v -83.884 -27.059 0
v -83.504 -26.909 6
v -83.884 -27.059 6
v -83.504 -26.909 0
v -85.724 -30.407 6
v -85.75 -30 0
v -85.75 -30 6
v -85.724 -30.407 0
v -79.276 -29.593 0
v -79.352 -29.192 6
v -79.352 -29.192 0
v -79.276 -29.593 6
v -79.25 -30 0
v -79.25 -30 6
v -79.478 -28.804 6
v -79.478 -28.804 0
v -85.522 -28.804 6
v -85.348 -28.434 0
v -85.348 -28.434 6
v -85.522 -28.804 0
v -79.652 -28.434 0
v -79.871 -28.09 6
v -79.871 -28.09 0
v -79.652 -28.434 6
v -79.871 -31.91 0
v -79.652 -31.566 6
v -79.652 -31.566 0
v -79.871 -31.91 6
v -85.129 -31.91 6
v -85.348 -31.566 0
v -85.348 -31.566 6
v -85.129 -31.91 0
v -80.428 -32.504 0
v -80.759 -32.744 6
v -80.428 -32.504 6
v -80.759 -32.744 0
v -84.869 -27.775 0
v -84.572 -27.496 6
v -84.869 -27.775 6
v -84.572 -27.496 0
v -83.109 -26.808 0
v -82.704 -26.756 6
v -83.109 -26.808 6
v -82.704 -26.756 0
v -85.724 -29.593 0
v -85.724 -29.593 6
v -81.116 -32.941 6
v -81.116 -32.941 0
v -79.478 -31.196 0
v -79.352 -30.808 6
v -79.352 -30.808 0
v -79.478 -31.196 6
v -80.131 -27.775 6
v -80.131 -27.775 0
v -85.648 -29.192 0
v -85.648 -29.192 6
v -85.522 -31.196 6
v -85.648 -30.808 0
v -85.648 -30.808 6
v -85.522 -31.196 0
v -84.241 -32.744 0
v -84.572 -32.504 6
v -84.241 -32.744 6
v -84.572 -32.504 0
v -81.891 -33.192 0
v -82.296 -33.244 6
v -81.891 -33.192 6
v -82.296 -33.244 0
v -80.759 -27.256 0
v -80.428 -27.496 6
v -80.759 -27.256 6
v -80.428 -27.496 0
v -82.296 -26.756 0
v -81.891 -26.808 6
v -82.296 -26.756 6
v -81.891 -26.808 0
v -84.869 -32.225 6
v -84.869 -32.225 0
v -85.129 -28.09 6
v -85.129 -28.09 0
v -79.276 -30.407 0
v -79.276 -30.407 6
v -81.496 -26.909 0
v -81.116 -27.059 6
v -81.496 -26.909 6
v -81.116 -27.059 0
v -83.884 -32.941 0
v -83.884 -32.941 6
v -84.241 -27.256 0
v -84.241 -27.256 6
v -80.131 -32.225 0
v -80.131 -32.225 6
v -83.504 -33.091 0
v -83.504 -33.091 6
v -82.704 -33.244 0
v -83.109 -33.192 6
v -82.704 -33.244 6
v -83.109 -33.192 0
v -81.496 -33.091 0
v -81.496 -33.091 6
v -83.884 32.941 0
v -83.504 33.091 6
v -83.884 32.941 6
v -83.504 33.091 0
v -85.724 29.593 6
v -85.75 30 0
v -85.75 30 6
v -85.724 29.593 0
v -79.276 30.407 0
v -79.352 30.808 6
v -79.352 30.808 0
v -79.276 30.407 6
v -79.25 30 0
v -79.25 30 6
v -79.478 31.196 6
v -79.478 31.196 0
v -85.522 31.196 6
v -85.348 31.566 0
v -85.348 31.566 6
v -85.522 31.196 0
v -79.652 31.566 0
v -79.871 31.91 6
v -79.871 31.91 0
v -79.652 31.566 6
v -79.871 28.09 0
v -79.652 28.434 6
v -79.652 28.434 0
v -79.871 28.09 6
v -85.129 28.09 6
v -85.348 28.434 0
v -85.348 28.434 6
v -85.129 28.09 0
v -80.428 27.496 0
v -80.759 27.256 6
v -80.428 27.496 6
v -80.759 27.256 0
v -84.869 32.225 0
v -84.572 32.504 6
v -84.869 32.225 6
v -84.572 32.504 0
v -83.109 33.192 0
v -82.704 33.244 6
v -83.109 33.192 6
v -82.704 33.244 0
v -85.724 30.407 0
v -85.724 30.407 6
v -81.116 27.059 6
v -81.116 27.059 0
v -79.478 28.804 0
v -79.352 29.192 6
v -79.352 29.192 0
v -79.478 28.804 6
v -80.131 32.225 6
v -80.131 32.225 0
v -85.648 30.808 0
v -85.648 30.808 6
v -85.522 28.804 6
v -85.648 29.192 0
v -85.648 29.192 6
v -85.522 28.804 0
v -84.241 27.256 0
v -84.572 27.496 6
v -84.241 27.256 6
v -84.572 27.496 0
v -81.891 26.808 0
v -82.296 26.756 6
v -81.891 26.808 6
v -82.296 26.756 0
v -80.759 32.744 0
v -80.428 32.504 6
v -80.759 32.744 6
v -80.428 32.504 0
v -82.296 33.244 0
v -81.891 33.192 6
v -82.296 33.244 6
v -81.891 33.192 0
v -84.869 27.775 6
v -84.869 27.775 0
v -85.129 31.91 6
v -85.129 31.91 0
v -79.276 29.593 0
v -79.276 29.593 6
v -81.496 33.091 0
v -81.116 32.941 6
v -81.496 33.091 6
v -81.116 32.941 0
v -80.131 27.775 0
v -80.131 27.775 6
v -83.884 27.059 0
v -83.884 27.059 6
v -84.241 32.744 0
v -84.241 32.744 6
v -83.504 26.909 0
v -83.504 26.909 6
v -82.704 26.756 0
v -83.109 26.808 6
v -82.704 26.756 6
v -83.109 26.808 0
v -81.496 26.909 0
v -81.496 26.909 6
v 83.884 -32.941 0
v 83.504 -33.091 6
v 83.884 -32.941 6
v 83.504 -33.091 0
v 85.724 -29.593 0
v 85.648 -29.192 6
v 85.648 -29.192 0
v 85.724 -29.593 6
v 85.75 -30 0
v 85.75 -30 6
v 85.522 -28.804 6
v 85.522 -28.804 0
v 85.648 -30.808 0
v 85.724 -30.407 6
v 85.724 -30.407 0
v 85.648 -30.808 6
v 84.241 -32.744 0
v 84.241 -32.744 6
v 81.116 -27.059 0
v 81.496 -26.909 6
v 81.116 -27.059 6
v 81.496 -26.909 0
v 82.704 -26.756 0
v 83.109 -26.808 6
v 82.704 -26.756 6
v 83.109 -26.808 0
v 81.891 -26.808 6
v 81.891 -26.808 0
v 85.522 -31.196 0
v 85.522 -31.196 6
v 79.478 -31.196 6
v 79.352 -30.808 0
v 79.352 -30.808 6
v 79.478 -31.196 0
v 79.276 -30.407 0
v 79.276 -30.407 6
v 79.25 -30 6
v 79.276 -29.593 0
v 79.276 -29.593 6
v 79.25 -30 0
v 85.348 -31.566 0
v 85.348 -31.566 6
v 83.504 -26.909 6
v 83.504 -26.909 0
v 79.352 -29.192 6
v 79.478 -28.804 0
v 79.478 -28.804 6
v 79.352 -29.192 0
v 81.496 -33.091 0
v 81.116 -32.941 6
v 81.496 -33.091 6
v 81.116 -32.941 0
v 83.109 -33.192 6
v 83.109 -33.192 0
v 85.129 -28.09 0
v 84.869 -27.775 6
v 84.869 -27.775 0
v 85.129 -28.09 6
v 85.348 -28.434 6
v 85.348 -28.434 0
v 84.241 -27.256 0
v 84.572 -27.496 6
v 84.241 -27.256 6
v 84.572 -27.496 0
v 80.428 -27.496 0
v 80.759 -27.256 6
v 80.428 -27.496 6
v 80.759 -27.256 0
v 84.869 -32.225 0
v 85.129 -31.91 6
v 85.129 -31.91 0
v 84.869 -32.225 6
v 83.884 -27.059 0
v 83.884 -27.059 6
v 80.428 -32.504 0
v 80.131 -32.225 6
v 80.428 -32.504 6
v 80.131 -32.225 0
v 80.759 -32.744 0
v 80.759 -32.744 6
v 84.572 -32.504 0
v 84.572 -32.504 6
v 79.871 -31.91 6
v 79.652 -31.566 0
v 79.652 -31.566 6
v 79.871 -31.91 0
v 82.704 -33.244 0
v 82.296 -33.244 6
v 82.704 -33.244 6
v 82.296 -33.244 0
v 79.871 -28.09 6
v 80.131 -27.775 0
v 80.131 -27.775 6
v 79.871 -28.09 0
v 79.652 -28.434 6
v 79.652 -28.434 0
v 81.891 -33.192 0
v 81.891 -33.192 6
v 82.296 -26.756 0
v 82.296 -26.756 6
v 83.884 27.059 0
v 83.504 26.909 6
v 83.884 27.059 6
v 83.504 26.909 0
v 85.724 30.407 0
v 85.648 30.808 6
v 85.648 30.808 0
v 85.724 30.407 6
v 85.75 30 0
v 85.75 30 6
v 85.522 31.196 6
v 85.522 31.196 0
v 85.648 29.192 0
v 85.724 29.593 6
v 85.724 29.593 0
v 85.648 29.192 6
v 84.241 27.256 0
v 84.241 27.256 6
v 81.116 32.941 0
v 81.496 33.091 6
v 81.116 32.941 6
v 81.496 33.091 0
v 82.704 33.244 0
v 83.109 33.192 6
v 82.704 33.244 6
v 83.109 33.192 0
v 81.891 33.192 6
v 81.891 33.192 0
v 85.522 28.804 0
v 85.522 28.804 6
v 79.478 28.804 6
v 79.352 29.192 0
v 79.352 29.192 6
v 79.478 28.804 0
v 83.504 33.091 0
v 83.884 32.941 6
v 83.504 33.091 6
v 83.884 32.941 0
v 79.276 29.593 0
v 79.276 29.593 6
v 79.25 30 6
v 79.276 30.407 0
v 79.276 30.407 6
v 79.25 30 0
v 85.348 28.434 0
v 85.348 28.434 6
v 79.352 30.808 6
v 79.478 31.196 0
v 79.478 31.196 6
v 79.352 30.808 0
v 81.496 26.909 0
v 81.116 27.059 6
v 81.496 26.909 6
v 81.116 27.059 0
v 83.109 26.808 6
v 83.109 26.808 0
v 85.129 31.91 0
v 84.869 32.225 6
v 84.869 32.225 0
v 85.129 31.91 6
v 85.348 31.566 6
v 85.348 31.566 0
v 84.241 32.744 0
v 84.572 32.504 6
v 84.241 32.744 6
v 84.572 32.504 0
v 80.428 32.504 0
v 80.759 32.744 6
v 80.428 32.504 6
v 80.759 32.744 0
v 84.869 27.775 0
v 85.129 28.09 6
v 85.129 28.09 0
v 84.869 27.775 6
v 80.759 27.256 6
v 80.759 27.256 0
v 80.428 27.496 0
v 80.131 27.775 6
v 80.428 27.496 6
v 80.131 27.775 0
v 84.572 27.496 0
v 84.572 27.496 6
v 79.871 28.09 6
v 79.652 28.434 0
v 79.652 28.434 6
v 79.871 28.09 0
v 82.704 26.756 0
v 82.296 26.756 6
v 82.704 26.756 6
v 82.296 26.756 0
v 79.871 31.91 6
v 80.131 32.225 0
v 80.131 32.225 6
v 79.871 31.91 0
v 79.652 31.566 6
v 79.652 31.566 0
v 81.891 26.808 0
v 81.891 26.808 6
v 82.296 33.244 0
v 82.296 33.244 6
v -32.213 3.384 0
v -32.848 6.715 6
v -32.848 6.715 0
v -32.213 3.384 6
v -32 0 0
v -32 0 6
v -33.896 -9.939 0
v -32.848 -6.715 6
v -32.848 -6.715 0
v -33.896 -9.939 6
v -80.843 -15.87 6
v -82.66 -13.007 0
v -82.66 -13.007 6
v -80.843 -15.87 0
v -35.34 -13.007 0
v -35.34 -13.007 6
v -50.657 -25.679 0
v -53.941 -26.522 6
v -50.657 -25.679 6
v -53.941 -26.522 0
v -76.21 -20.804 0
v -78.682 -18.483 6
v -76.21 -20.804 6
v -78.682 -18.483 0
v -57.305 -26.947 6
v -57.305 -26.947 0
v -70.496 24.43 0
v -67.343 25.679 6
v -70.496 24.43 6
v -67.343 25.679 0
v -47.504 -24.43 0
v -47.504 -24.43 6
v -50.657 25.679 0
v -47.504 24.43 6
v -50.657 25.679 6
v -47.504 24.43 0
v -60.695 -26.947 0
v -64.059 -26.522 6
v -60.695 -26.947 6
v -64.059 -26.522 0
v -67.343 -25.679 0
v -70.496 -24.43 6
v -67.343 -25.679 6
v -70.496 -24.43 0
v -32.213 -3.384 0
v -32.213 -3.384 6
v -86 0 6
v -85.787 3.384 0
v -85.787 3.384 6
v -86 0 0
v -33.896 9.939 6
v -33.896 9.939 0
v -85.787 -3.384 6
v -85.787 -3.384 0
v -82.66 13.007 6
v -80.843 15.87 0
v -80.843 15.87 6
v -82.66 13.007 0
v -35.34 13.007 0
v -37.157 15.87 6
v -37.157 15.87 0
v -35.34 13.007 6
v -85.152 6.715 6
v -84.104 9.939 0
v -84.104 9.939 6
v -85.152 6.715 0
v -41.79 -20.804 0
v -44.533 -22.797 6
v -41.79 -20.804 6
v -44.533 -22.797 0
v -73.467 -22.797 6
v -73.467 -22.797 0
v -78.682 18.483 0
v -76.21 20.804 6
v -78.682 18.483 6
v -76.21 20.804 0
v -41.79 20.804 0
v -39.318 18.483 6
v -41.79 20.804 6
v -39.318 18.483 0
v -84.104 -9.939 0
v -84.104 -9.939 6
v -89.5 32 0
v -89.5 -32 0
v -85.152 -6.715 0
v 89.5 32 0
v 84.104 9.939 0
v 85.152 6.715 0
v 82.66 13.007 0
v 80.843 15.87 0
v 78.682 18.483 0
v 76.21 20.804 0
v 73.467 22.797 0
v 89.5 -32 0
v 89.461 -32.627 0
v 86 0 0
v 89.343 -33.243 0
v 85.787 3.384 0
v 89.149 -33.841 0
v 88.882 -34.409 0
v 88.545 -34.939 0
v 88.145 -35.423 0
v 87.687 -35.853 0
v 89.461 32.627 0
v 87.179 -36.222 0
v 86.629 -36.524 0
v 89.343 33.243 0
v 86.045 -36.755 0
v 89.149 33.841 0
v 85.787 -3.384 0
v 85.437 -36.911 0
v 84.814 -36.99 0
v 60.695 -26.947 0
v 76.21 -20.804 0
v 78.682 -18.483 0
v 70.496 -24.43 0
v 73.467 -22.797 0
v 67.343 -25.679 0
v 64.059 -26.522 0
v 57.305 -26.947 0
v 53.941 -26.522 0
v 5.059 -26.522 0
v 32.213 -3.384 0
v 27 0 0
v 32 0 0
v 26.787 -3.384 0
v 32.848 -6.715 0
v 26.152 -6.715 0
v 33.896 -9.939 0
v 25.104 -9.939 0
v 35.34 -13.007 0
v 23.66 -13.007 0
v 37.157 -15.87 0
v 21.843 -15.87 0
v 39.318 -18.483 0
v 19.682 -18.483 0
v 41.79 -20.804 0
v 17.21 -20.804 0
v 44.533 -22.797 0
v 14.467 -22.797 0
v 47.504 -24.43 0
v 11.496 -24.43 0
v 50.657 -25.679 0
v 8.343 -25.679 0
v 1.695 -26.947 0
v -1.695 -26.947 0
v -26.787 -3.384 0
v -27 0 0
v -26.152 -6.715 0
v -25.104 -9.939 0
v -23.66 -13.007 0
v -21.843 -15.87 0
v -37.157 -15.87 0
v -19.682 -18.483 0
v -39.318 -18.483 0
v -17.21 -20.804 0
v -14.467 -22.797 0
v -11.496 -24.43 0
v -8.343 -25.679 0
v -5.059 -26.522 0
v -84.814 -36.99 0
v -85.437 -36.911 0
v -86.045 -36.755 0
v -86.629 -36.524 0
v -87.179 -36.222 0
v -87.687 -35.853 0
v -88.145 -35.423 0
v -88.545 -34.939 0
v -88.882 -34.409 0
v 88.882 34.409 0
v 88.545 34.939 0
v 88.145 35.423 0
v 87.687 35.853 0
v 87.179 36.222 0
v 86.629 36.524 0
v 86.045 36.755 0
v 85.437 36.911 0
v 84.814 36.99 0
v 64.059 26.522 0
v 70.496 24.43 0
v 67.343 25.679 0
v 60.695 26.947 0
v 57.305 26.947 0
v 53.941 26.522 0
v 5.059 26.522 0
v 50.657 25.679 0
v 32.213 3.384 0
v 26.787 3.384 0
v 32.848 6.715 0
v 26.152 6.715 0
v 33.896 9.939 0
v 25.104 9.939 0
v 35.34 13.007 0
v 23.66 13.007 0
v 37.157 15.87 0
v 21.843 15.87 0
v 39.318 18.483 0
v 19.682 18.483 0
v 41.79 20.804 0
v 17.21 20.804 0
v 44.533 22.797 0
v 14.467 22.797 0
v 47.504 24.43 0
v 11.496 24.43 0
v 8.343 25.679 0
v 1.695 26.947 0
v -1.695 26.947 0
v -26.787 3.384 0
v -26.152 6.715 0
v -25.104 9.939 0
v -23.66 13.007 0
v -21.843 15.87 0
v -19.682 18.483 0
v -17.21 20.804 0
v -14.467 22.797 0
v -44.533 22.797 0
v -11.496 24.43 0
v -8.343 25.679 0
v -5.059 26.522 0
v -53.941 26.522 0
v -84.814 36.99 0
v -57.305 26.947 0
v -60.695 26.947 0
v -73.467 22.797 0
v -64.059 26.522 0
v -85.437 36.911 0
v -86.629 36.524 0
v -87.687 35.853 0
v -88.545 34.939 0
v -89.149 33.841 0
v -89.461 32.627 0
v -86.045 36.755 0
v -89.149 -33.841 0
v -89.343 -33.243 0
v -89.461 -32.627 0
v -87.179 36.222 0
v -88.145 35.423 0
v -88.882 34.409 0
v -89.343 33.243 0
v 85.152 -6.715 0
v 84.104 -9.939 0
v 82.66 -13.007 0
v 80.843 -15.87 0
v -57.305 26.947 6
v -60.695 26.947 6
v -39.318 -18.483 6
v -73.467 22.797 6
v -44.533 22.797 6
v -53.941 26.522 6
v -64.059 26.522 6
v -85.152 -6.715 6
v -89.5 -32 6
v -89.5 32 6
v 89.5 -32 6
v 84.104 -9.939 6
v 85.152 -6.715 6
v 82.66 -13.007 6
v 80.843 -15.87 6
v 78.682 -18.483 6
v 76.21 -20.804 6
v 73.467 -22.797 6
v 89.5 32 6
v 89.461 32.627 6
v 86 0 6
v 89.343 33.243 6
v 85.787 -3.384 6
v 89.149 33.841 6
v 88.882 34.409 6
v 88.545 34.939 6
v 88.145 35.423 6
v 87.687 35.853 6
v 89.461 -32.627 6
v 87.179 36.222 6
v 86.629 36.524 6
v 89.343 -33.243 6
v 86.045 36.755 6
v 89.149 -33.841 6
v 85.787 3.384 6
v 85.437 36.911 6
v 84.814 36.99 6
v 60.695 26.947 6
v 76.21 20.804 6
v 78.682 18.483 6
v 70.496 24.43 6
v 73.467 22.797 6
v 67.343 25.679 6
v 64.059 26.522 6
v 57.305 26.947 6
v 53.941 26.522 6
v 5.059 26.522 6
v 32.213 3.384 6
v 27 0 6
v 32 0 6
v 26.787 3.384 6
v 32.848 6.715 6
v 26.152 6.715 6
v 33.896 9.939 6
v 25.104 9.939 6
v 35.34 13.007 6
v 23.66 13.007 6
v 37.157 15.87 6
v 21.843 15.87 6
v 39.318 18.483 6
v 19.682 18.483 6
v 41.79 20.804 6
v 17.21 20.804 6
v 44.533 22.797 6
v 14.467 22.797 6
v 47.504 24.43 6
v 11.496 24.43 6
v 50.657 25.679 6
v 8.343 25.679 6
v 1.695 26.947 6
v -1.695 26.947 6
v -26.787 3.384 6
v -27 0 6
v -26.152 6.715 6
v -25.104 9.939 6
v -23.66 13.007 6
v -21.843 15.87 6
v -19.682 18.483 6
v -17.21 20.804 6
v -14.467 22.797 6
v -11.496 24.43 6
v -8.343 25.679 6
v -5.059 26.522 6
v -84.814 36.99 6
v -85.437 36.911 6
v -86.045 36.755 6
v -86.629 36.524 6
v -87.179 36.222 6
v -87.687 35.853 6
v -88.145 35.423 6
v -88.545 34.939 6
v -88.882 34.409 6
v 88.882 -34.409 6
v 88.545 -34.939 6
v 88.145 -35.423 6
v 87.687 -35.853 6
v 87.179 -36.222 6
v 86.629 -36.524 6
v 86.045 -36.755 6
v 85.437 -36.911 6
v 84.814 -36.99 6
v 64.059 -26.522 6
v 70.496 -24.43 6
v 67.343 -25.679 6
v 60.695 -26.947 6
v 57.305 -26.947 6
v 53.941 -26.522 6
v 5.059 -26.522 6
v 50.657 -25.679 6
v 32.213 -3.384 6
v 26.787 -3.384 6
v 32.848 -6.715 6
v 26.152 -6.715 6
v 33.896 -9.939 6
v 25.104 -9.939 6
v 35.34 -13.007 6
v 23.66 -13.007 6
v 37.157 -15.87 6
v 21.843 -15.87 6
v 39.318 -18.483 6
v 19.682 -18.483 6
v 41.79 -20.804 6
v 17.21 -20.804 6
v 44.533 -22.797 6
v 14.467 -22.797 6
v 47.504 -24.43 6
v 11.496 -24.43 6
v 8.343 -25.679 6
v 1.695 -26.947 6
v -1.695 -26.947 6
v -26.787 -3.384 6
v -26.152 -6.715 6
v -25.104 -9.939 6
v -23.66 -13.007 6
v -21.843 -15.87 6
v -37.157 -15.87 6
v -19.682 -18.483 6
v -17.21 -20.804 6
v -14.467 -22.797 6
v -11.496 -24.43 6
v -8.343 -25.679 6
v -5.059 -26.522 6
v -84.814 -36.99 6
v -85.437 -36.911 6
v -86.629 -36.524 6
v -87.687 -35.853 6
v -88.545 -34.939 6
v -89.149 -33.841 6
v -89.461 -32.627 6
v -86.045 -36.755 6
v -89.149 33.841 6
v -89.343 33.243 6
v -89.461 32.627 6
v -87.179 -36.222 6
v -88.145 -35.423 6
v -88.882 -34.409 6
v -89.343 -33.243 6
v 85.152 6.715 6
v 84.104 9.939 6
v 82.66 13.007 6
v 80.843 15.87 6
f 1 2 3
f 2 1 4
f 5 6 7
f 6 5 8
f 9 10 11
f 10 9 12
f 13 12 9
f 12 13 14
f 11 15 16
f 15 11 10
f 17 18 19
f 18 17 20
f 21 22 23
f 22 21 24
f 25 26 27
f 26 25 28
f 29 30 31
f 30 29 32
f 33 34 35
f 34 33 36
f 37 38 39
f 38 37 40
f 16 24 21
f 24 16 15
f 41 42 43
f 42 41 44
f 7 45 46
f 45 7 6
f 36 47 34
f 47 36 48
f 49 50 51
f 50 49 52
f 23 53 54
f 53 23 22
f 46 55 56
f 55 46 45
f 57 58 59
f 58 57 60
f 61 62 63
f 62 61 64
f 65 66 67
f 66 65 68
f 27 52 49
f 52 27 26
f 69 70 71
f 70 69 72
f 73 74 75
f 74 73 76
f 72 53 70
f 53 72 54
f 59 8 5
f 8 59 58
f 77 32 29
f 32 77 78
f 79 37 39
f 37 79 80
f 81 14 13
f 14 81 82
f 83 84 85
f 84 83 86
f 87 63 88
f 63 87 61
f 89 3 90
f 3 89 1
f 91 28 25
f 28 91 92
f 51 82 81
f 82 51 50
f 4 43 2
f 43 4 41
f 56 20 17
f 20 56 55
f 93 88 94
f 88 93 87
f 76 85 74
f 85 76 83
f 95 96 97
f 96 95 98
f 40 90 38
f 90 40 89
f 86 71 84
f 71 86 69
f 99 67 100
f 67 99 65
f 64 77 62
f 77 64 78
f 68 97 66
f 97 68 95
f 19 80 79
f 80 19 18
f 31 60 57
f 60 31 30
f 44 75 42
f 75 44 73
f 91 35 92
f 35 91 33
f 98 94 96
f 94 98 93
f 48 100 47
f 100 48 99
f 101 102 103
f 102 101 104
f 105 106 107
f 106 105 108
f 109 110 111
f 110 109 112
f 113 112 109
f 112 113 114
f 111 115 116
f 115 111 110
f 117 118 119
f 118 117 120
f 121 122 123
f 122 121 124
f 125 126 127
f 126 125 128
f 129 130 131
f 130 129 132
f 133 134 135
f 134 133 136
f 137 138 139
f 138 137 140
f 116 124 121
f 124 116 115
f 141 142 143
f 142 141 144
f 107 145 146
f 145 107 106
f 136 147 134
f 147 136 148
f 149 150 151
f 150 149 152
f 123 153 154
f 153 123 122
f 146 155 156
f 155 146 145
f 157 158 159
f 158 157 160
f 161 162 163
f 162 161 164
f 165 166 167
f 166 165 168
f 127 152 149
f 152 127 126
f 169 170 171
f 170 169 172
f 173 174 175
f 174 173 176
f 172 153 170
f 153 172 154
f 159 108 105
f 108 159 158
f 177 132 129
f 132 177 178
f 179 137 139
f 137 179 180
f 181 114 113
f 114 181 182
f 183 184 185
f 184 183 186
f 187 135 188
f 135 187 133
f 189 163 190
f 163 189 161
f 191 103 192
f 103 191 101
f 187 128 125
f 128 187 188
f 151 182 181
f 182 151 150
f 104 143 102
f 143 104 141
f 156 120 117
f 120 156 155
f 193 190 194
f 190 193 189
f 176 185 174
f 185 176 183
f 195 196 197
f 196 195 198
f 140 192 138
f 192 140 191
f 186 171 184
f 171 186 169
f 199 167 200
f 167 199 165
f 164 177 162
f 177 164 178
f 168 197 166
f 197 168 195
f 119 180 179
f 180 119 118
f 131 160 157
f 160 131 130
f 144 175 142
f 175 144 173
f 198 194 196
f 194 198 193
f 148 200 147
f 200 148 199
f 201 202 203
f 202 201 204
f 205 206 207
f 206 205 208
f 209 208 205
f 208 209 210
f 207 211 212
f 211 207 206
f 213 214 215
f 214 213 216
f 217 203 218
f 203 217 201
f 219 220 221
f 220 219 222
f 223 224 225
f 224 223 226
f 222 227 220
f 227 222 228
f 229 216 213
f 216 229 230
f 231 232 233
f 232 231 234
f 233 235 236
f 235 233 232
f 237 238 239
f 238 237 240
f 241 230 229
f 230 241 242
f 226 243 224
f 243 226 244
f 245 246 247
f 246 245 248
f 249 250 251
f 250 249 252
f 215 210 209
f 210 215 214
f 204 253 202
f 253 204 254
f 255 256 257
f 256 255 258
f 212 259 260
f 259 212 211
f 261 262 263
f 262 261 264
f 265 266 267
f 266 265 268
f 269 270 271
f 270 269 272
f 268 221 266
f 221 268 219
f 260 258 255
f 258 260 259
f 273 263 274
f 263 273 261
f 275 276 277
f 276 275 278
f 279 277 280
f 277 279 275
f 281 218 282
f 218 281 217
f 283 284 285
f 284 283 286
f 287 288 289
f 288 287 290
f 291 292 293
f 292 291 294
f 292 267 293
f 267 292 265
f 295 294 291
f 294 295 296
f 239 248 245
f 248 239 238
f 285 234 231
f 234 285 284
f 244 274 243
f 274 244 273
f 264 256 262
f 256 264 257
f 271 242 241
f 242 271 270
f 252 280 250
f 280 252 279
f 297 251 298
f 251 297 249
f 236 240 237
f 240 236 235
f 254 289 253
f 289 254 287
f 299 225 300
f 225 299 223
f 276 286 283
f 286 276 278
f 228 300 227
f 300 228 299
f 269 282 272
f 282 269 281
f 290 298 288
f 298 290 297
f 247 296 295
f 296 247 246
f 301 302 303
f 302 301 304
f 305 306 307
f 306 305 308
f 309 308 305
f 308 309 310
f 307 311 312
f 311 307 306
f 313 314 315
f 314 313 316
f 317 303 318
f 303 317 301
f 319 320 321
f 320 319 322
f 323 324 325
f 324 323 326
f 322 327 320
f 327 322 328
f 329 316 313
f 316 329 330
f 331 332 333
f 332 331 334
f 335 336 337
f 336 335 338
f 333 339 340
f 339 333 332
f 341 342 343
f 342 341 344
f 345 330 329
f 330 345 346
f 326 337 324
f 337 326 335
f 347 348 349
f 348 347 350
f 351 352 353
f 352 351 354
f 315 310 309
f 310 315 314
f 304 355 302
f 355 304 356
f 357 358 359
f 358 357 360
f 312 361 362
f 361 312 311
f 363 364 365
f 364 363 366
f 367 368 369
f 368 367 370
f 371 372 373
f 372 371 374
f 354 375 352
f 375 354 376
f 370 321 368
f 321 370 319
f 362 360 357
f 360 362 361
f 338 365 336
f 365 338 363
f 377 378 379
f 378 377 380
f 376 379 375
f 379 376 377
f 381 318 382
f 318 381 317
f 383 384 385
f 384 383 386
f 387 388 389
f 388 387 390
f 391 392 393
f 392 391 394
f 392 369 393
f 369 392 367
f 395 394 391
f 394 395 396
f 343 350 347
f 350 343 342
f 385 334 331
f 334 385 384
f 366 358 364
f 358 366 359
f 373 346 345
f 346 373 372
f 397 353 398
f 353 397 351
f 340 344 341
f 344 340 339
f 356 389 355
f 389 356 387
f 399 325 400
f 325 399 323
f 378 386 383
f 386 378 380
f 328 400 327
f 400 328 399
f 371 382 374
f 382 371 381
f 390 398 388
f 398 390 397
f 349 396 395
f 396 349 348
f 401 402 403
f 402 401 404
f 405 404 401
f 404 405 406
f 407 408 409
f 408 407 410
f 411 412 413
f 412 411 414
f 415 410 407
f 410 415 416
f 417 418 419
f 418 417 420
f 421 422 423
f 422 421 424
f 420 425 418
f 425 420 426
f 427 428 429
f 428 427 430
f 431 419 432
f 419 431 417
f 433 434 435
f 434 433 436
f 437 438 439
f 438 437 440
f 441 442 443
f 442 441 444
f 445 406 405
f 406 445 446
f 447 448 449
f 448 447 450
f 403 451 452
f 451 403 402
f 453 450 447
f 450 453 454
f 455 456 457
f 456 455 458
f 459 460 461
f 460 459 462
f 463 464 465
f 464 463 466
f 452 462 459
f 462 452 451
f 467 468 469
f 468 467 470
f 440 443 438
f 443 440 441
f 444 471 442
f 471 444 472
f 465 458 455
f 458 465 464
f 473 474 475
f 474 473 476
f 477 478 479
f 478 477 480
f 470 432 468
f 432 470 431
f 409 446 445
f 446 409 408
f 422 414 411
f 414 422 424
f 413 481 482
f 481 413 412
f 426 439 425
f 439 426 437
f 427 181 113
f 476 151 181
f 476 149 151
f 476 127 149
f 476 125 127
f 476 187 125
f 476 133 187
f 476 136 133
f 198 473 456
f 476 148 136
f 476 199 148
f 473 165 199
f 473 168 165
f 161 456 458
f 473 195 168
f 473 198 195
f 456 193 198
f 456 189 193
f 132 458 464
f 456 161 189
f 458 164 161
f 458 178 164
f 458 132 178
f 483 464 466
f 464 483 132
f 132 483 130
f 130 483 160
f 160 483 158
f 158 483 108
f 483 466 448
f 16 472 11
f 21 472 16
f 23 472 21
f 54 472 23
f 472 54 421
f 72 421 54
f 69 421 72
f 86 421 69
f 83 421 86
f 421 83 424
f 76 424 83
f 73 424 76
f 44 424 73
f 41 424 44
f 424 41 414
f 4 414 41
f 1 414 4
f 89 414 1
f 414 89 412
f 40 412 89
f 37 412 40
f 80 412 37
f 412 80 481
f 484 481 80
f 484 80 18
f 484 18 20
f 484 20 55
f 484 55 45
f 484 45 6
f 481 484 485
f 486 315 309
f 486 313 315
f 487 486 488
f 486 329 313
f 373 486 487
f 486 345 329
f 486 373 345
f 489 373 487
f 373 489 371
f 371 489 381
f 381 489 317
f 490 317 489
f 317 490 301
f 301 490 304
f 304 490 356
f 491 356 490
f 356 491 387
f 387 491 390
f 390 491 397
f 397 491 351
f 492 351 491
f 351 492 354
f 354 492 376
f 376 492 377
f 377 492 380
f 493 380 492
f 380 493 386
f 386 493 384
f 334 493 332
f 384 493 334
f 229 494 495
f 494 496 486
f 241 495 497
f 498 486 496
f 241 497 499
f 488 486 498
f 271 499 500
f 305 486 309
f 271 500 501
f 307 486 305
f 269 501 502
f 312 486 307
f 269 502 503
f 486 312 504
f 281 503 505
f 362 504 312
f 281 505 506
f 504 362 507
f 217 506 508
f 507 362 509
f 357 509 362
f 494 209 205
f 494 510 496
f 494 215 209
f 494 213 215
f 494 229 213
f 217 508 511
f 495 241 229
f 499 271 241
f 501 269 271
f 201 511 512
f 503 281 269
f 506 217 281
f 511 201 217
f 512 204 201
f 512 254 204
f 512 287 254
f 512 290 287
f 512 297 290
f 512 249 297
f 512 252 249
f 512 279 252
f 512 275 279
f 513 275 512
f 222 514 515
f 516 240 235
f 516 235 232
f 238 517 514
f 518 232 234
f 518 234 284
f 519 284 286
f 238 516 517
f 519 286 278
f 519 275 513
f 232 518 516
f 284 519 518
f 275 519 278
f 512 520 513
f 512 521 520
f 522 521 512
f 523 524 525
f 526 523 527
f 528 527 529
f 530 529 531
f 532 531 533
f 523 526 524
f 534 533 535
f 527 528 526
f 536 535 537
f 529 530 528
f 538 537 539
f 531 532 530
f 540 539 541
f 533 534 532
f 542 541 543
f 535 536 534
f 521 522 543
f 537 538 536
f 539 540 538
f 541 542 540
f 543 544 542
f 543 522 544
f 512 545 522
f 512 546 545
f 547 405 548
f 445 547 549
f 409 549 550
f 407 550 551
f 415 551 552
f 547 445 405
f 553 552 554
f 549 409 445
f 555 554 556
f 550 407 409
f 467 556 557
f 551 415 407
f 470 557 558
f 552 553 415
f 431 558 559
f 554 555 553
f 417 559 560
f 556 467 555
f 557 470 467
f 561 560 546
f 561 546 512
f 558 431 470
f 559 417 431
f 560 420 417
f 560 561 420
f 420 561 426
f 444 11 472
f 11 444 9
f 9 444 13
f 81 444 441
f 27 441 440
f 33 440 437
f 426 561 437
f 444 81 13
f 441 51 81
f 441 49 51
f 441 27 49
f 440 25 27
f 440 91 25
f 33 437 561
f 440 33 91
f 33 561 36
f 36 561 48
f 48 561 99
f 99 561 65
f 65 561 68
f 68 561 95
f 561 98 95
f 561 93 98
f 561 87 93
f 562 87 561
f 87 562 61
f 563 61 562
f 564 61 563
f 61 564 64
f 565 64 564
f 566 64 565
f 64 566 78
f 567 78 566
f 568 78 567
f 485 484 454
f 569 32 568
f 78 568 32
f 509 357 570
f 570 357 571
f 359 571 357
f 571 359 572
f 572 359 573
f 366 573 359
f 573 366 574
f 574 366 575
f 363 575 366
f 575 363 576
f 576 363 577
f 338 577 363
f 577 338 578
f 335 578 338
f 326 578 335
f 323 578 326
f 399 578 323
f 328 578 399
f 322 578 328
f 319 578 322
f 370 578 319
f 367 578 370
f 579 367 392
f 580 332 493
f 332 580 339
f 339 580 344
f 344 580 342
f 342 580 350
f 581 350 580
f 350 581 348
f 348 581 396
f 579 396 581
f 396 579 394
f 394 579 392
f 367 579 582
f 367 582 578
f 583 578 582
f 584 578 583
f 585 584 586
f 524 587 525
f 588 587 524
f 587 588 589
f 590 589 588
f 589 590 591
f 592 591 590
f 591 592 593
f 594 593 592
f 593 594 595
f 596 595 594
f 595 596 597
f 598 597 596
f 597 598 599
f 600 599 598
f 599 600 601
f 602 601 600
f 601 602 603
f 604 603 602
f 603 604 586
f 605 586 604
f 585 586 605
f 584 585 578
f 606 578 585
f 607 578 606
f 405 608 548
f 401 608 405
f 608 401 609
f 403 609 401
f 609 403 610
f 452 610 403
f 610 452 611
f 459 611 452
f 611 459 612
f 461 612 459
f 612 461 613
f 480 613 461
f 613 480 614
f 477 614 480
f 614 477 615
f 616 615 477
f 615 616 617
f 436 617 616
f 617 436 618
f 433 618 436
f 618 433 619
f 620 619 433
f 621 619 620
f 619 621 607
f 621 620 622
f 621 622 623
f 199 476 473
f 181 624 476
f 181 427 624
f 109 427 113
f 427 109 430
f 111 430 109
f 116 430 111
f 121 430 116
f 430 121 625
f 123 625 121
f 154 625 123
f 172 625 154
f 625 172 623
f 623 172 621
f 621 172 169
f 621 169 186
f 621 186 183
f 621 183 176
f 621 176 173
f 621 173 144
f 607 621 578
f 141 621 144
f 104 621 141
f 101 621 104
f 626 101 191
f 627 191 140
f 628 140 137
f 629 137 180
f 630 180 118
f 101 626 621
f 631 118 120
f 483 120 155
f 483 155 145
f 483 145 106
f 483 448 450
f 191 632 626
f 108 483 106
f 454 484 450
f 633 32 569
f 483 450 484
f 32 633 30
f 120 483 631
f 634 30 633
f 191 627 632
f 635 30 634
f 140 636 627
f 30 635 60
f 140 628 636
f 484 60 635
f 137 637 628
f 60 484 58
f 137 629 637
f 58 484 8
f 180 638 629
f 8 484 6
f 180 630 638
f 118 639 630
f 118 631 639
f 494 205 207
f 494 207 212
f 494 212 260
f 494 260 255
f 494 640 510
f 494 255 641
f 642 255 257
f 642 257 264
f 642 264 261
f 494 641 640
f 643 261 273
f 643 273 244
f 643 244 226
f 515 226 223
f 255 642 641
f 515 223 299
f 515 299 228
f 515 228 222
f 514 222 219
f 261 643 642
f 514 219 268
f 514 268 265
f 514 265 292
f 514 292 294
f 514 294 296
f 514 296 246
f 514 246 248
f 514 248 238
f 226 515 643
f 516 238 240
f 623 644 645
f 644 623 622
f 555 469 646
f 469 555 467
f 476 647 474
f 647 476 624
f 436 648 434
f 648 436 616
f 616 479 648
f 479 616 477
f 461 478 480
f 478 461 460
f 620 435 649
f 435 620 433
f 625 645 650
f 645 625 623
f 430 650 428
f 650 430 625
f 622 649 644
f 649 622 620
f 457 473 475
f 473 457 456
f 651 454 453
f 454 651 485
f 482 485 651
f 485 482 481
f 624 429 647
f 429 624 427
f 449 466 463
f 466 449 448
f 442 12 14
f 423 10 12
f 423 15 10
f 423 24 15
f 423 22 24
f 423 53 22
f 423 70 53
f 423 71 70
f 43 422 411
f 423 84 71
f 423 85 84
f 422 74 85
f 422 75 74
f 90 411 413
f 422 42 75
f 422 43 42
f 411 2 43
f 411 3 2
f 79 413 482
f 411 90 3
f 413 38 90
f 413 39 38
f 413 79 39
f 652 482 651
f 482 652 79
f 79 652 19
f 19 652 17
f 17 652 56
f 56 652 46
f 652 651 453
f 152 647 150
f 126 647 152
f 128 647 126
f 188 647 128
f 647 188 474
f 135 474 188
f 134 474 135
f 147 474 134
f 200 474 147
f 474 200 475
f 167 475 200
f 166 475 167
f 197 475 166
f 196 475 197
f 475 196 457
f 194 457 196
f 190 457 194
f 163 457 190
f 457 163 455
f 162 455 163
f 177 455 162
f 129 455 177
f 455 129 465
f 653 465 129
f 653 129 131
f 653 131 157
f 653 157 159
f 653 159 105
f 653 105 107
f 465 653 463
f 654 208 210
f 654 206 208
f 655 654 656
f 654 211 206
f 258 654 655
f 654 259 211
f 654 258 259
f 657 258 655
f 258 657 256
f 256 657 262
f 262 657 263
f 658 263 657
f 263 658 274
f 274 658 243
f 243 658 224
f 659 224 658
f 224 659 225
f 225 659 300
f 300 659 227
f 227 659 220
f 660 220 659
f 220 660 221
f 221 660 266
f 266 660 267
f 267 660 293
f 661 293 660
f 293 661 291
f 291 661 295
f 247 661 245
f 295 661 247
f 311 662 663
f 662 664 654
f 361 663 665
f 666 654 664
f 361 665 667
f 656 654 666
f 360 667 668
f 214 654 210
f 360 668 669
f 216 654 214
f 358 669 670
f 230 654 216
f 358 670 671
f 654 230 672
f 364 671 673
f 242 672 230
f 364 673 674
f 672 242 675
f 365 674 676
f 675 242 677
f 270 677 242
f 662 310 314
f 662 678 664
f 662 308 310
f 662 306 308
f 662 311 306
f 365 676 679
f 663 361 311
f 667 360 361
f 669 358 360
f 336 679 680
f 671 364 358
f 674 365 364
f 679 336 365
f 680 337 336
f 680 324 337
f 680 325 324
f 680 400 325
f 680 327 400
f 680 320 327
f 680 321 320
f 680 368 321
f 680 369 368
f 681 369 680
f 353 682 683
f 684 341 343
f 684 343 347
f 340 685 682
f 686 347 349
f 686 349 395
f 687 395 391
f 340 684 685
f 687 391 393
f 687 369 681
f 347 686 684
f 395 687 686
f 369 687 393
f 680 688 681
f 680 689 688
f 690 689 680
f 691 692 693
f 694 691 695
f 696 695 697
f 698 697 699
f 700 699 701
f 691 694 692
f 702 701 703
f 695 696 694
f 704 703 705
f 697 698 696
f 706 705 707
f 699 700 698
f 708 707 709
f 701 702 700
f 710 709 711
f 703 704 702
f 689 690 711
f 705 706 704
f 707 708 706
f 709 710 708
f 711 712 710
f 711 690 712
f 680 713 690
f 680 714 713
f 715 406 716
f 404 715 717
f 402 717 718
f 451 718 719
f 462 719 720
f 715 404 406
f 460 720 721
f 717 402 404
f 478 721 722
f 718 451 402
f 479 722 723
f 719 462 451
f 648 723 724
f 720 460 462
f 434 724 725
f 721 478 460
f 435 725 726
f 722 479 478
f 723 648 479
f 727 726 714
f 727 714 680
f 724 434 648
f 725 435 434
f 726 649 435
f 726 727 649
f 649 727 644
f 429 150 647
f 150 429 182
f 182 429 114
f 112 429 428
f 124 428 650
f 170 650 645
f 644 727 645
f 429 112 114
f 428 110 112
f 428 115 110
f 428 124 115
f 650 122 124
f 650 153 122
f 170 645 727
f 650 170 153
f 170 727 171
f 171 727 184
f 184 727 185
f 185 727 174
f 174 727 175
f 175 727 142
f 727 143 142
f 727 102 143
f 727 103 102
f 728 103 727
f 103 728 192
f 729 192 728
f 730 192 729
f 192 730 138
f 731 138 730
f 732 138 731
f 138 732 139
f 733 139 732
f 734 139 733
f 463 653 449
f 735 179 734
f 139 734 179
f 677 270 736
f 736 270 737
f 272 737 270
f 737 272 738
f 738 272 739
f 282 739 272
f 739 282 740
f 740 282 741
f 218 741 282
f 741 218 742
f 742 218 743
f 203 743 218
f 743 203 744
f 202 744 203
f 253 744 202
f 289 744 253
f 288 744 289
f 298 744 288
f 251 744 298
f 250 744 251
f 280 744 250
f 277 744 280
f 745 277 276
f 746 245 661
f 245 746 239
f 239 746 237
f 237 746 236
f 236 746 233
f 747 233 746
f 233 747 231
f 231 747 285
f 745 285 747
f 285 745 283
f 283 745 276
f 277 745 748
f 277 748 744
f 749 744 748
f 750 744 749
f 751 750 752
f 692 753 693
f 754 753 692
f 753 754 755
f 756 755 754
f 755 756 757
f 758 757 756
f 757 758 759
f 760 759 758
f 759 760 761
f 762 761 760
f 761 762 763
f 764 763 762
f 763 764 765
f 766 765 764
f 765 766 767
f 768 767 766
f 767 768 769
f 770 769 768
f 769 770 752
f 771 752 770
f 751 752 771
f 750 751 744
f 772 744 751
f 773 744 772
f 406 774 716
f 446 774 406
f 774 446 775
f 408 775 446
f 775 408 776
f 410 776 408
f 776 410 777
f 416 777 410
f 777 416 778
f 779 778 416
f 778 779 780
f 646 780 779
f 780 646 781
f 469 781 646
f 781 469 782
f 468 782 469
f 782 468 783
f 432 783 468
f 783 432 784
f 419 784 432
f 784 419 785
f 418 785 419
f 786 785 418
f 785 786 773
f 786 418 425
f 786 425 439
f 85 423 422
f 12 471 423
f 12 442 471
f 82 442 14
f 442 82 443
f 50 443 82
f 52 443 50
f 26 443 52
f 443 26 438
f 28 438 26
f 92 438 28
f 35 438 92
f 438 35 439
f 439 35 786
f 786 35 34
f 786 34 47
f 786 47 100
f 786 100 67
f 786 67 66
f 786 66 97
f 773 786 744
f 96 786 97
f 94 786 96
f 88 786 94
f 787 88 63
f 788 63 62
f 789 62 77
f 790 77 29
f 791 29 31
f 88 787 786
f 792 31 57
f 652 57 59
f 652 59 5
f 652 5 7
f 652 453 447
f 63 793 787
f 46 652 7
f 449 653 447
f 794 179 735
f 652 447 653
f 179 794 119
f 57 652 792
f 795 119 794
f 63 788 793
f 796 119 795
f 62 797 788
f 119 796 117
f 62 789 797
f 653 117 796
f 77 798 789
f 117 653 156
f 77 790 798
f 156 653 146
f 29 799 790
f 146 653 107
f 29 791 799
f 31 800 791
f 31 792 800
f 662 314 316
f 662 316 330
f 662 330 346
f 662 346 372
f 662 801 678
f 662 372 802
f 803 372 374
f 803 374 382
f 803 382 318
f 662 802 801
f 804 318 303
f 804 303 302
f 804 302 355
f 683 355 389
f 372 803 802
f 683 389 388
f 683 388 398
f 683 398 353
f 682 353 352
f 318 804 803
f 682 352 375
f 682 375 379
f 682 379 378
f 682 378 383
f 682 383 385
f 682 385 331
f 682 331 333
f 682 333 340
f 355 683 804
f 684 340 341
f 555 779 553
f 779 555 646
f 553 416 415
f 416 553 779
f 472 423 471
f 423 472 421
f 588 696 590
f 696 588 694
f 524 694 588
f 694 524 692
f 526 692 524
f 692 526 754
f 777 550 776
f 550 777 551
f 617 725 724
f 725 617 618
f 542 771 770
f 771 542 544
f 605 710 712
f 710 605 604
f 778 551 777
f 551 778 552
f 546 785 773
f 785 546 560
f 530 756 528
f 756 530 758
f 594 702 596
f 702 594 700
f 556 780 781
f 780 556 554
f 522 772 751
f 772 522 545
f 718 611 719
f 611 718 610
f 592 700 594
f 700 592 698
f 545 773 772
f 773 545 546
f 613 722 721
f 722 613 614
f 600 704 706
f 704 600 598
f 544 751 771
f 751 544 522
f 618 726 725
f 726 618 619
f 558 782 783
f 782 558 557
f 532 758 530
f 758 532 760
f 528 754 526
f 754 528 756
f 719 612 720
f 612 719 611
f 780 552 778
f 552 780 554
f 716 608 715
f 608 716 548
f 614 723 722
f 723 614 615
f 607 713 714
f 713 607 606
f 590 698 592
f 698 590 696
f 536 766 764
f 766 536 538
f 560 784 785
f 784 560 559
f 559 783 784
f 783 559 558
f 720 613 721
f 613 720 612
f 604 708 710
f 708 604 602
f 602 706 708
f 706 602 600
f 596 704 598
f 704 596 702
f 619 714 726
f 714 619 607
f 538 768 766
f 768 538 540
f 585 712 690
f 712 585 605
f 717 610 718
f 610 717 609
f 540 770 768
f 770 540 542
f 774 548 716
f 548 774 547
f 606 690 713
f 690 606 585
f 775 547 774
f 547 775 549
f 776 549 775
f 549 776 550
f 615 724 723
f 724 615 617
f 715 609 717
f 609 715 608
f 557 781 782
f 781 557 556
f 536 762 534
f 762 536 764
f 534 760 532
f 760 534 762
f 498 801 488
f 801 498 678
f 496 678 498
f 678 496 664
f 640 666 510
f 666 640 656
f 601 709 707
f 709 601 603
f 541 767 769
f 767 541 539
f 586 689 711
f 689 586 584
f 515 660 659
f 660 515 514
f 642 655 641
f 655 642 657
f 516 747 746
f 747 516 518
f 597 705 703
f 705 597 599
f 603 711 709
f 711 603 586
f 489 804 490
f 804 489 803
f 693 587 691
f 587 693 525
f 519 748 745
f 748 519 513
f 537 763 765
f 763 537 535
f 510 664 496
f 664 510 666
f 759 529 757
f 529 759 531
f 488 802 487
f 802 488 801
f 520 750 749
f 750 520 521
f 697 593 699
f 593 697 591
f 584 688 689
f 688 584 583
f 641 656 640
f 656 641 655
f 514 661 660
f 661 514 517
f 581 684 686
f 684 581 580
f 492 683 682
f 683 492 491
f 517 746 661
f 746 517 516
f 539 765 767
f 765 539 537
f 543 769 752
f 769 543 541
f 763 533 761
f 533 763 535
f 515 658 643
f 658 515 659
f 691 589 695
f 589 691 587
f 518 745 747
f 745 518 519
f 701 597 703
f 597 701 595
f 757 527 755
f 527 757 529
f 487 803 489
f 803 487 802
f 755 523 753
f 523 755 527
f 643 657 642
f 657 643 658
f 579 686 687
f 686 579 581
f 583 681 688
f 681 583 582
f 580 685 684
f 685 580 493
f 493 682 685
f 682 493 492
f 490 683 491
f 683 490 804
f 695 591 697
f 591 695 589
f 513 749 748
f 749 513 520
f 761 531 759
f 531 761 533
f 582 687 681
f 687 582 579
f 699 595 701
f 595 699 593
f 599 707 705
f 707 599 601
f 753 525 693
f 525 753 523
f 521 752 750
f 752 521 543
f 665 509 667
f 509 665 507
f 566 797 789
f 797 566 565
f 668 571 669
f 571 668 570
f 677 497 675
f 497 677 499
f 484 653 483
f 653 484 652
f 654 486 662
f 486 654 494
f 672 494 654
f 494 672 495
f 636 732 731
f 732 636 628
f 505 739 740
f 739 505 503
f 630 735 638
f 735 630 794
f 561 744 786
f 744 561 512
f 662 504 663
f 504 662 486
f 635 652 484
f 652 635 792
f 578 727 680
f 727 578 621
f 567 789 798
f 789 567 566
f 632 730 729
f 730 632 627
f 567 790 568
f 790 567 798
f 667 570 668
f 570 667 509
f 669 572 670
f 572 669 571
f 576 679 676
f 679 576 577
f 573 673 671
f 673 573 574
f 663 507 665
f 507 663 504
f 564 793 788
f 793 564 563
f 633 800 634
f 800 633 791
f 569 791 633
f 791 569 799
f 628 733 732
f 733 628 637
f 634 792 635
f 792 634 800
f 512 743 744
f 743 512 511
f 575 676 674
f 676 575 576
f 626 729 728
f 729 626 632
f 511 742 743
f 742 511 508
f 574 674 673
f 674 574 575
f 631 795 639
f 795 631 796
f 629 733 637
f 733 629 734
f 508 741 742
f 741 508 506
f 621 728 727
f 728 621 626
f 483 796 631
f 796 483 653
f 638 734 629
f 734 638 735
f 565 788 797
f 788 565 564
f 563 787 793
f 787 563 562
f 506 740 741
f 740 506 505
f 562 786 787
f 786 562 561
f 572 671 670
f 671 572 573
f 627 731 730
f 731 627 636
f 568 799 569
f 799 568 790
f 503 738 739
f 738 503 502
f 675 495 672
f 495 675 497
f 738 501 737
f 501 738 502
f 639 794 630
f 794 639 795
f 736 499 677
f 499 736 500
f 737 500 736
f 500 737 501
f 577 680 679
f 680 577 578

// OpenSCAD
$fn = 50;

difference() {
	union() {
		hull() {
			translate(v = [-84.5, 32.0, 0]) {
				cylinder(h = 6, r = 5);
			}
			translate(v = [84.5, 32.0, 0]) {
				cylinder(h = 6, r = 5);
			}
			translate(v = [-84.5, -32.0, 0]) {
				cylinder(h = 6, r = 5);
			}
			translate(v = [84.5, -32.0, 0]) {
				cylinder(h = 6, r = 5);
			}
		}
	}
	union() {
		translate(v = [-82.5, -30.0, -100.0]) {
			cylinder(h = 200, r = 3.25);
		}
		translate(v = [-82.5, 30.0, -100.0]) {
			cylinder(h = 200, r = 3.25);
		}
		translate(v = [82.5, -30.0, -100.0]) {
			cylinder(h = 200, r = 3.25);
		}
		translate(v = [82.5, 30.0, -100.0]) {
			cylinder(h = 200, r = 3.25);
		}
		translate(v = [-82.5, -30.0, -100.0]) {
			cylinder(h = 200, r = 1.8);
		}
		translate(v = [-82.5, 30.0, -100.0]) {
			cylinder(h = 200, r = 1.8);
		}
		translate(v = [82.5, -30.0, -100.0]) {
			cylinder(h = 200, r = 1.8);
		}
		translate(v = [82.5, 30.0, -100.0]) {
			cylinder(h = 200, r = 1.8);
		}
		translate(v = [-59.0, 0, 0.0]) {
			cylinder(h = 6, r = 27.0);
		}
		cylinder(h = 6, r = 27.0);
		translate(v = [59.0, 0, 0.0]) {
			cylinder(h = 6, r = 27.0);
		}
	}
}
